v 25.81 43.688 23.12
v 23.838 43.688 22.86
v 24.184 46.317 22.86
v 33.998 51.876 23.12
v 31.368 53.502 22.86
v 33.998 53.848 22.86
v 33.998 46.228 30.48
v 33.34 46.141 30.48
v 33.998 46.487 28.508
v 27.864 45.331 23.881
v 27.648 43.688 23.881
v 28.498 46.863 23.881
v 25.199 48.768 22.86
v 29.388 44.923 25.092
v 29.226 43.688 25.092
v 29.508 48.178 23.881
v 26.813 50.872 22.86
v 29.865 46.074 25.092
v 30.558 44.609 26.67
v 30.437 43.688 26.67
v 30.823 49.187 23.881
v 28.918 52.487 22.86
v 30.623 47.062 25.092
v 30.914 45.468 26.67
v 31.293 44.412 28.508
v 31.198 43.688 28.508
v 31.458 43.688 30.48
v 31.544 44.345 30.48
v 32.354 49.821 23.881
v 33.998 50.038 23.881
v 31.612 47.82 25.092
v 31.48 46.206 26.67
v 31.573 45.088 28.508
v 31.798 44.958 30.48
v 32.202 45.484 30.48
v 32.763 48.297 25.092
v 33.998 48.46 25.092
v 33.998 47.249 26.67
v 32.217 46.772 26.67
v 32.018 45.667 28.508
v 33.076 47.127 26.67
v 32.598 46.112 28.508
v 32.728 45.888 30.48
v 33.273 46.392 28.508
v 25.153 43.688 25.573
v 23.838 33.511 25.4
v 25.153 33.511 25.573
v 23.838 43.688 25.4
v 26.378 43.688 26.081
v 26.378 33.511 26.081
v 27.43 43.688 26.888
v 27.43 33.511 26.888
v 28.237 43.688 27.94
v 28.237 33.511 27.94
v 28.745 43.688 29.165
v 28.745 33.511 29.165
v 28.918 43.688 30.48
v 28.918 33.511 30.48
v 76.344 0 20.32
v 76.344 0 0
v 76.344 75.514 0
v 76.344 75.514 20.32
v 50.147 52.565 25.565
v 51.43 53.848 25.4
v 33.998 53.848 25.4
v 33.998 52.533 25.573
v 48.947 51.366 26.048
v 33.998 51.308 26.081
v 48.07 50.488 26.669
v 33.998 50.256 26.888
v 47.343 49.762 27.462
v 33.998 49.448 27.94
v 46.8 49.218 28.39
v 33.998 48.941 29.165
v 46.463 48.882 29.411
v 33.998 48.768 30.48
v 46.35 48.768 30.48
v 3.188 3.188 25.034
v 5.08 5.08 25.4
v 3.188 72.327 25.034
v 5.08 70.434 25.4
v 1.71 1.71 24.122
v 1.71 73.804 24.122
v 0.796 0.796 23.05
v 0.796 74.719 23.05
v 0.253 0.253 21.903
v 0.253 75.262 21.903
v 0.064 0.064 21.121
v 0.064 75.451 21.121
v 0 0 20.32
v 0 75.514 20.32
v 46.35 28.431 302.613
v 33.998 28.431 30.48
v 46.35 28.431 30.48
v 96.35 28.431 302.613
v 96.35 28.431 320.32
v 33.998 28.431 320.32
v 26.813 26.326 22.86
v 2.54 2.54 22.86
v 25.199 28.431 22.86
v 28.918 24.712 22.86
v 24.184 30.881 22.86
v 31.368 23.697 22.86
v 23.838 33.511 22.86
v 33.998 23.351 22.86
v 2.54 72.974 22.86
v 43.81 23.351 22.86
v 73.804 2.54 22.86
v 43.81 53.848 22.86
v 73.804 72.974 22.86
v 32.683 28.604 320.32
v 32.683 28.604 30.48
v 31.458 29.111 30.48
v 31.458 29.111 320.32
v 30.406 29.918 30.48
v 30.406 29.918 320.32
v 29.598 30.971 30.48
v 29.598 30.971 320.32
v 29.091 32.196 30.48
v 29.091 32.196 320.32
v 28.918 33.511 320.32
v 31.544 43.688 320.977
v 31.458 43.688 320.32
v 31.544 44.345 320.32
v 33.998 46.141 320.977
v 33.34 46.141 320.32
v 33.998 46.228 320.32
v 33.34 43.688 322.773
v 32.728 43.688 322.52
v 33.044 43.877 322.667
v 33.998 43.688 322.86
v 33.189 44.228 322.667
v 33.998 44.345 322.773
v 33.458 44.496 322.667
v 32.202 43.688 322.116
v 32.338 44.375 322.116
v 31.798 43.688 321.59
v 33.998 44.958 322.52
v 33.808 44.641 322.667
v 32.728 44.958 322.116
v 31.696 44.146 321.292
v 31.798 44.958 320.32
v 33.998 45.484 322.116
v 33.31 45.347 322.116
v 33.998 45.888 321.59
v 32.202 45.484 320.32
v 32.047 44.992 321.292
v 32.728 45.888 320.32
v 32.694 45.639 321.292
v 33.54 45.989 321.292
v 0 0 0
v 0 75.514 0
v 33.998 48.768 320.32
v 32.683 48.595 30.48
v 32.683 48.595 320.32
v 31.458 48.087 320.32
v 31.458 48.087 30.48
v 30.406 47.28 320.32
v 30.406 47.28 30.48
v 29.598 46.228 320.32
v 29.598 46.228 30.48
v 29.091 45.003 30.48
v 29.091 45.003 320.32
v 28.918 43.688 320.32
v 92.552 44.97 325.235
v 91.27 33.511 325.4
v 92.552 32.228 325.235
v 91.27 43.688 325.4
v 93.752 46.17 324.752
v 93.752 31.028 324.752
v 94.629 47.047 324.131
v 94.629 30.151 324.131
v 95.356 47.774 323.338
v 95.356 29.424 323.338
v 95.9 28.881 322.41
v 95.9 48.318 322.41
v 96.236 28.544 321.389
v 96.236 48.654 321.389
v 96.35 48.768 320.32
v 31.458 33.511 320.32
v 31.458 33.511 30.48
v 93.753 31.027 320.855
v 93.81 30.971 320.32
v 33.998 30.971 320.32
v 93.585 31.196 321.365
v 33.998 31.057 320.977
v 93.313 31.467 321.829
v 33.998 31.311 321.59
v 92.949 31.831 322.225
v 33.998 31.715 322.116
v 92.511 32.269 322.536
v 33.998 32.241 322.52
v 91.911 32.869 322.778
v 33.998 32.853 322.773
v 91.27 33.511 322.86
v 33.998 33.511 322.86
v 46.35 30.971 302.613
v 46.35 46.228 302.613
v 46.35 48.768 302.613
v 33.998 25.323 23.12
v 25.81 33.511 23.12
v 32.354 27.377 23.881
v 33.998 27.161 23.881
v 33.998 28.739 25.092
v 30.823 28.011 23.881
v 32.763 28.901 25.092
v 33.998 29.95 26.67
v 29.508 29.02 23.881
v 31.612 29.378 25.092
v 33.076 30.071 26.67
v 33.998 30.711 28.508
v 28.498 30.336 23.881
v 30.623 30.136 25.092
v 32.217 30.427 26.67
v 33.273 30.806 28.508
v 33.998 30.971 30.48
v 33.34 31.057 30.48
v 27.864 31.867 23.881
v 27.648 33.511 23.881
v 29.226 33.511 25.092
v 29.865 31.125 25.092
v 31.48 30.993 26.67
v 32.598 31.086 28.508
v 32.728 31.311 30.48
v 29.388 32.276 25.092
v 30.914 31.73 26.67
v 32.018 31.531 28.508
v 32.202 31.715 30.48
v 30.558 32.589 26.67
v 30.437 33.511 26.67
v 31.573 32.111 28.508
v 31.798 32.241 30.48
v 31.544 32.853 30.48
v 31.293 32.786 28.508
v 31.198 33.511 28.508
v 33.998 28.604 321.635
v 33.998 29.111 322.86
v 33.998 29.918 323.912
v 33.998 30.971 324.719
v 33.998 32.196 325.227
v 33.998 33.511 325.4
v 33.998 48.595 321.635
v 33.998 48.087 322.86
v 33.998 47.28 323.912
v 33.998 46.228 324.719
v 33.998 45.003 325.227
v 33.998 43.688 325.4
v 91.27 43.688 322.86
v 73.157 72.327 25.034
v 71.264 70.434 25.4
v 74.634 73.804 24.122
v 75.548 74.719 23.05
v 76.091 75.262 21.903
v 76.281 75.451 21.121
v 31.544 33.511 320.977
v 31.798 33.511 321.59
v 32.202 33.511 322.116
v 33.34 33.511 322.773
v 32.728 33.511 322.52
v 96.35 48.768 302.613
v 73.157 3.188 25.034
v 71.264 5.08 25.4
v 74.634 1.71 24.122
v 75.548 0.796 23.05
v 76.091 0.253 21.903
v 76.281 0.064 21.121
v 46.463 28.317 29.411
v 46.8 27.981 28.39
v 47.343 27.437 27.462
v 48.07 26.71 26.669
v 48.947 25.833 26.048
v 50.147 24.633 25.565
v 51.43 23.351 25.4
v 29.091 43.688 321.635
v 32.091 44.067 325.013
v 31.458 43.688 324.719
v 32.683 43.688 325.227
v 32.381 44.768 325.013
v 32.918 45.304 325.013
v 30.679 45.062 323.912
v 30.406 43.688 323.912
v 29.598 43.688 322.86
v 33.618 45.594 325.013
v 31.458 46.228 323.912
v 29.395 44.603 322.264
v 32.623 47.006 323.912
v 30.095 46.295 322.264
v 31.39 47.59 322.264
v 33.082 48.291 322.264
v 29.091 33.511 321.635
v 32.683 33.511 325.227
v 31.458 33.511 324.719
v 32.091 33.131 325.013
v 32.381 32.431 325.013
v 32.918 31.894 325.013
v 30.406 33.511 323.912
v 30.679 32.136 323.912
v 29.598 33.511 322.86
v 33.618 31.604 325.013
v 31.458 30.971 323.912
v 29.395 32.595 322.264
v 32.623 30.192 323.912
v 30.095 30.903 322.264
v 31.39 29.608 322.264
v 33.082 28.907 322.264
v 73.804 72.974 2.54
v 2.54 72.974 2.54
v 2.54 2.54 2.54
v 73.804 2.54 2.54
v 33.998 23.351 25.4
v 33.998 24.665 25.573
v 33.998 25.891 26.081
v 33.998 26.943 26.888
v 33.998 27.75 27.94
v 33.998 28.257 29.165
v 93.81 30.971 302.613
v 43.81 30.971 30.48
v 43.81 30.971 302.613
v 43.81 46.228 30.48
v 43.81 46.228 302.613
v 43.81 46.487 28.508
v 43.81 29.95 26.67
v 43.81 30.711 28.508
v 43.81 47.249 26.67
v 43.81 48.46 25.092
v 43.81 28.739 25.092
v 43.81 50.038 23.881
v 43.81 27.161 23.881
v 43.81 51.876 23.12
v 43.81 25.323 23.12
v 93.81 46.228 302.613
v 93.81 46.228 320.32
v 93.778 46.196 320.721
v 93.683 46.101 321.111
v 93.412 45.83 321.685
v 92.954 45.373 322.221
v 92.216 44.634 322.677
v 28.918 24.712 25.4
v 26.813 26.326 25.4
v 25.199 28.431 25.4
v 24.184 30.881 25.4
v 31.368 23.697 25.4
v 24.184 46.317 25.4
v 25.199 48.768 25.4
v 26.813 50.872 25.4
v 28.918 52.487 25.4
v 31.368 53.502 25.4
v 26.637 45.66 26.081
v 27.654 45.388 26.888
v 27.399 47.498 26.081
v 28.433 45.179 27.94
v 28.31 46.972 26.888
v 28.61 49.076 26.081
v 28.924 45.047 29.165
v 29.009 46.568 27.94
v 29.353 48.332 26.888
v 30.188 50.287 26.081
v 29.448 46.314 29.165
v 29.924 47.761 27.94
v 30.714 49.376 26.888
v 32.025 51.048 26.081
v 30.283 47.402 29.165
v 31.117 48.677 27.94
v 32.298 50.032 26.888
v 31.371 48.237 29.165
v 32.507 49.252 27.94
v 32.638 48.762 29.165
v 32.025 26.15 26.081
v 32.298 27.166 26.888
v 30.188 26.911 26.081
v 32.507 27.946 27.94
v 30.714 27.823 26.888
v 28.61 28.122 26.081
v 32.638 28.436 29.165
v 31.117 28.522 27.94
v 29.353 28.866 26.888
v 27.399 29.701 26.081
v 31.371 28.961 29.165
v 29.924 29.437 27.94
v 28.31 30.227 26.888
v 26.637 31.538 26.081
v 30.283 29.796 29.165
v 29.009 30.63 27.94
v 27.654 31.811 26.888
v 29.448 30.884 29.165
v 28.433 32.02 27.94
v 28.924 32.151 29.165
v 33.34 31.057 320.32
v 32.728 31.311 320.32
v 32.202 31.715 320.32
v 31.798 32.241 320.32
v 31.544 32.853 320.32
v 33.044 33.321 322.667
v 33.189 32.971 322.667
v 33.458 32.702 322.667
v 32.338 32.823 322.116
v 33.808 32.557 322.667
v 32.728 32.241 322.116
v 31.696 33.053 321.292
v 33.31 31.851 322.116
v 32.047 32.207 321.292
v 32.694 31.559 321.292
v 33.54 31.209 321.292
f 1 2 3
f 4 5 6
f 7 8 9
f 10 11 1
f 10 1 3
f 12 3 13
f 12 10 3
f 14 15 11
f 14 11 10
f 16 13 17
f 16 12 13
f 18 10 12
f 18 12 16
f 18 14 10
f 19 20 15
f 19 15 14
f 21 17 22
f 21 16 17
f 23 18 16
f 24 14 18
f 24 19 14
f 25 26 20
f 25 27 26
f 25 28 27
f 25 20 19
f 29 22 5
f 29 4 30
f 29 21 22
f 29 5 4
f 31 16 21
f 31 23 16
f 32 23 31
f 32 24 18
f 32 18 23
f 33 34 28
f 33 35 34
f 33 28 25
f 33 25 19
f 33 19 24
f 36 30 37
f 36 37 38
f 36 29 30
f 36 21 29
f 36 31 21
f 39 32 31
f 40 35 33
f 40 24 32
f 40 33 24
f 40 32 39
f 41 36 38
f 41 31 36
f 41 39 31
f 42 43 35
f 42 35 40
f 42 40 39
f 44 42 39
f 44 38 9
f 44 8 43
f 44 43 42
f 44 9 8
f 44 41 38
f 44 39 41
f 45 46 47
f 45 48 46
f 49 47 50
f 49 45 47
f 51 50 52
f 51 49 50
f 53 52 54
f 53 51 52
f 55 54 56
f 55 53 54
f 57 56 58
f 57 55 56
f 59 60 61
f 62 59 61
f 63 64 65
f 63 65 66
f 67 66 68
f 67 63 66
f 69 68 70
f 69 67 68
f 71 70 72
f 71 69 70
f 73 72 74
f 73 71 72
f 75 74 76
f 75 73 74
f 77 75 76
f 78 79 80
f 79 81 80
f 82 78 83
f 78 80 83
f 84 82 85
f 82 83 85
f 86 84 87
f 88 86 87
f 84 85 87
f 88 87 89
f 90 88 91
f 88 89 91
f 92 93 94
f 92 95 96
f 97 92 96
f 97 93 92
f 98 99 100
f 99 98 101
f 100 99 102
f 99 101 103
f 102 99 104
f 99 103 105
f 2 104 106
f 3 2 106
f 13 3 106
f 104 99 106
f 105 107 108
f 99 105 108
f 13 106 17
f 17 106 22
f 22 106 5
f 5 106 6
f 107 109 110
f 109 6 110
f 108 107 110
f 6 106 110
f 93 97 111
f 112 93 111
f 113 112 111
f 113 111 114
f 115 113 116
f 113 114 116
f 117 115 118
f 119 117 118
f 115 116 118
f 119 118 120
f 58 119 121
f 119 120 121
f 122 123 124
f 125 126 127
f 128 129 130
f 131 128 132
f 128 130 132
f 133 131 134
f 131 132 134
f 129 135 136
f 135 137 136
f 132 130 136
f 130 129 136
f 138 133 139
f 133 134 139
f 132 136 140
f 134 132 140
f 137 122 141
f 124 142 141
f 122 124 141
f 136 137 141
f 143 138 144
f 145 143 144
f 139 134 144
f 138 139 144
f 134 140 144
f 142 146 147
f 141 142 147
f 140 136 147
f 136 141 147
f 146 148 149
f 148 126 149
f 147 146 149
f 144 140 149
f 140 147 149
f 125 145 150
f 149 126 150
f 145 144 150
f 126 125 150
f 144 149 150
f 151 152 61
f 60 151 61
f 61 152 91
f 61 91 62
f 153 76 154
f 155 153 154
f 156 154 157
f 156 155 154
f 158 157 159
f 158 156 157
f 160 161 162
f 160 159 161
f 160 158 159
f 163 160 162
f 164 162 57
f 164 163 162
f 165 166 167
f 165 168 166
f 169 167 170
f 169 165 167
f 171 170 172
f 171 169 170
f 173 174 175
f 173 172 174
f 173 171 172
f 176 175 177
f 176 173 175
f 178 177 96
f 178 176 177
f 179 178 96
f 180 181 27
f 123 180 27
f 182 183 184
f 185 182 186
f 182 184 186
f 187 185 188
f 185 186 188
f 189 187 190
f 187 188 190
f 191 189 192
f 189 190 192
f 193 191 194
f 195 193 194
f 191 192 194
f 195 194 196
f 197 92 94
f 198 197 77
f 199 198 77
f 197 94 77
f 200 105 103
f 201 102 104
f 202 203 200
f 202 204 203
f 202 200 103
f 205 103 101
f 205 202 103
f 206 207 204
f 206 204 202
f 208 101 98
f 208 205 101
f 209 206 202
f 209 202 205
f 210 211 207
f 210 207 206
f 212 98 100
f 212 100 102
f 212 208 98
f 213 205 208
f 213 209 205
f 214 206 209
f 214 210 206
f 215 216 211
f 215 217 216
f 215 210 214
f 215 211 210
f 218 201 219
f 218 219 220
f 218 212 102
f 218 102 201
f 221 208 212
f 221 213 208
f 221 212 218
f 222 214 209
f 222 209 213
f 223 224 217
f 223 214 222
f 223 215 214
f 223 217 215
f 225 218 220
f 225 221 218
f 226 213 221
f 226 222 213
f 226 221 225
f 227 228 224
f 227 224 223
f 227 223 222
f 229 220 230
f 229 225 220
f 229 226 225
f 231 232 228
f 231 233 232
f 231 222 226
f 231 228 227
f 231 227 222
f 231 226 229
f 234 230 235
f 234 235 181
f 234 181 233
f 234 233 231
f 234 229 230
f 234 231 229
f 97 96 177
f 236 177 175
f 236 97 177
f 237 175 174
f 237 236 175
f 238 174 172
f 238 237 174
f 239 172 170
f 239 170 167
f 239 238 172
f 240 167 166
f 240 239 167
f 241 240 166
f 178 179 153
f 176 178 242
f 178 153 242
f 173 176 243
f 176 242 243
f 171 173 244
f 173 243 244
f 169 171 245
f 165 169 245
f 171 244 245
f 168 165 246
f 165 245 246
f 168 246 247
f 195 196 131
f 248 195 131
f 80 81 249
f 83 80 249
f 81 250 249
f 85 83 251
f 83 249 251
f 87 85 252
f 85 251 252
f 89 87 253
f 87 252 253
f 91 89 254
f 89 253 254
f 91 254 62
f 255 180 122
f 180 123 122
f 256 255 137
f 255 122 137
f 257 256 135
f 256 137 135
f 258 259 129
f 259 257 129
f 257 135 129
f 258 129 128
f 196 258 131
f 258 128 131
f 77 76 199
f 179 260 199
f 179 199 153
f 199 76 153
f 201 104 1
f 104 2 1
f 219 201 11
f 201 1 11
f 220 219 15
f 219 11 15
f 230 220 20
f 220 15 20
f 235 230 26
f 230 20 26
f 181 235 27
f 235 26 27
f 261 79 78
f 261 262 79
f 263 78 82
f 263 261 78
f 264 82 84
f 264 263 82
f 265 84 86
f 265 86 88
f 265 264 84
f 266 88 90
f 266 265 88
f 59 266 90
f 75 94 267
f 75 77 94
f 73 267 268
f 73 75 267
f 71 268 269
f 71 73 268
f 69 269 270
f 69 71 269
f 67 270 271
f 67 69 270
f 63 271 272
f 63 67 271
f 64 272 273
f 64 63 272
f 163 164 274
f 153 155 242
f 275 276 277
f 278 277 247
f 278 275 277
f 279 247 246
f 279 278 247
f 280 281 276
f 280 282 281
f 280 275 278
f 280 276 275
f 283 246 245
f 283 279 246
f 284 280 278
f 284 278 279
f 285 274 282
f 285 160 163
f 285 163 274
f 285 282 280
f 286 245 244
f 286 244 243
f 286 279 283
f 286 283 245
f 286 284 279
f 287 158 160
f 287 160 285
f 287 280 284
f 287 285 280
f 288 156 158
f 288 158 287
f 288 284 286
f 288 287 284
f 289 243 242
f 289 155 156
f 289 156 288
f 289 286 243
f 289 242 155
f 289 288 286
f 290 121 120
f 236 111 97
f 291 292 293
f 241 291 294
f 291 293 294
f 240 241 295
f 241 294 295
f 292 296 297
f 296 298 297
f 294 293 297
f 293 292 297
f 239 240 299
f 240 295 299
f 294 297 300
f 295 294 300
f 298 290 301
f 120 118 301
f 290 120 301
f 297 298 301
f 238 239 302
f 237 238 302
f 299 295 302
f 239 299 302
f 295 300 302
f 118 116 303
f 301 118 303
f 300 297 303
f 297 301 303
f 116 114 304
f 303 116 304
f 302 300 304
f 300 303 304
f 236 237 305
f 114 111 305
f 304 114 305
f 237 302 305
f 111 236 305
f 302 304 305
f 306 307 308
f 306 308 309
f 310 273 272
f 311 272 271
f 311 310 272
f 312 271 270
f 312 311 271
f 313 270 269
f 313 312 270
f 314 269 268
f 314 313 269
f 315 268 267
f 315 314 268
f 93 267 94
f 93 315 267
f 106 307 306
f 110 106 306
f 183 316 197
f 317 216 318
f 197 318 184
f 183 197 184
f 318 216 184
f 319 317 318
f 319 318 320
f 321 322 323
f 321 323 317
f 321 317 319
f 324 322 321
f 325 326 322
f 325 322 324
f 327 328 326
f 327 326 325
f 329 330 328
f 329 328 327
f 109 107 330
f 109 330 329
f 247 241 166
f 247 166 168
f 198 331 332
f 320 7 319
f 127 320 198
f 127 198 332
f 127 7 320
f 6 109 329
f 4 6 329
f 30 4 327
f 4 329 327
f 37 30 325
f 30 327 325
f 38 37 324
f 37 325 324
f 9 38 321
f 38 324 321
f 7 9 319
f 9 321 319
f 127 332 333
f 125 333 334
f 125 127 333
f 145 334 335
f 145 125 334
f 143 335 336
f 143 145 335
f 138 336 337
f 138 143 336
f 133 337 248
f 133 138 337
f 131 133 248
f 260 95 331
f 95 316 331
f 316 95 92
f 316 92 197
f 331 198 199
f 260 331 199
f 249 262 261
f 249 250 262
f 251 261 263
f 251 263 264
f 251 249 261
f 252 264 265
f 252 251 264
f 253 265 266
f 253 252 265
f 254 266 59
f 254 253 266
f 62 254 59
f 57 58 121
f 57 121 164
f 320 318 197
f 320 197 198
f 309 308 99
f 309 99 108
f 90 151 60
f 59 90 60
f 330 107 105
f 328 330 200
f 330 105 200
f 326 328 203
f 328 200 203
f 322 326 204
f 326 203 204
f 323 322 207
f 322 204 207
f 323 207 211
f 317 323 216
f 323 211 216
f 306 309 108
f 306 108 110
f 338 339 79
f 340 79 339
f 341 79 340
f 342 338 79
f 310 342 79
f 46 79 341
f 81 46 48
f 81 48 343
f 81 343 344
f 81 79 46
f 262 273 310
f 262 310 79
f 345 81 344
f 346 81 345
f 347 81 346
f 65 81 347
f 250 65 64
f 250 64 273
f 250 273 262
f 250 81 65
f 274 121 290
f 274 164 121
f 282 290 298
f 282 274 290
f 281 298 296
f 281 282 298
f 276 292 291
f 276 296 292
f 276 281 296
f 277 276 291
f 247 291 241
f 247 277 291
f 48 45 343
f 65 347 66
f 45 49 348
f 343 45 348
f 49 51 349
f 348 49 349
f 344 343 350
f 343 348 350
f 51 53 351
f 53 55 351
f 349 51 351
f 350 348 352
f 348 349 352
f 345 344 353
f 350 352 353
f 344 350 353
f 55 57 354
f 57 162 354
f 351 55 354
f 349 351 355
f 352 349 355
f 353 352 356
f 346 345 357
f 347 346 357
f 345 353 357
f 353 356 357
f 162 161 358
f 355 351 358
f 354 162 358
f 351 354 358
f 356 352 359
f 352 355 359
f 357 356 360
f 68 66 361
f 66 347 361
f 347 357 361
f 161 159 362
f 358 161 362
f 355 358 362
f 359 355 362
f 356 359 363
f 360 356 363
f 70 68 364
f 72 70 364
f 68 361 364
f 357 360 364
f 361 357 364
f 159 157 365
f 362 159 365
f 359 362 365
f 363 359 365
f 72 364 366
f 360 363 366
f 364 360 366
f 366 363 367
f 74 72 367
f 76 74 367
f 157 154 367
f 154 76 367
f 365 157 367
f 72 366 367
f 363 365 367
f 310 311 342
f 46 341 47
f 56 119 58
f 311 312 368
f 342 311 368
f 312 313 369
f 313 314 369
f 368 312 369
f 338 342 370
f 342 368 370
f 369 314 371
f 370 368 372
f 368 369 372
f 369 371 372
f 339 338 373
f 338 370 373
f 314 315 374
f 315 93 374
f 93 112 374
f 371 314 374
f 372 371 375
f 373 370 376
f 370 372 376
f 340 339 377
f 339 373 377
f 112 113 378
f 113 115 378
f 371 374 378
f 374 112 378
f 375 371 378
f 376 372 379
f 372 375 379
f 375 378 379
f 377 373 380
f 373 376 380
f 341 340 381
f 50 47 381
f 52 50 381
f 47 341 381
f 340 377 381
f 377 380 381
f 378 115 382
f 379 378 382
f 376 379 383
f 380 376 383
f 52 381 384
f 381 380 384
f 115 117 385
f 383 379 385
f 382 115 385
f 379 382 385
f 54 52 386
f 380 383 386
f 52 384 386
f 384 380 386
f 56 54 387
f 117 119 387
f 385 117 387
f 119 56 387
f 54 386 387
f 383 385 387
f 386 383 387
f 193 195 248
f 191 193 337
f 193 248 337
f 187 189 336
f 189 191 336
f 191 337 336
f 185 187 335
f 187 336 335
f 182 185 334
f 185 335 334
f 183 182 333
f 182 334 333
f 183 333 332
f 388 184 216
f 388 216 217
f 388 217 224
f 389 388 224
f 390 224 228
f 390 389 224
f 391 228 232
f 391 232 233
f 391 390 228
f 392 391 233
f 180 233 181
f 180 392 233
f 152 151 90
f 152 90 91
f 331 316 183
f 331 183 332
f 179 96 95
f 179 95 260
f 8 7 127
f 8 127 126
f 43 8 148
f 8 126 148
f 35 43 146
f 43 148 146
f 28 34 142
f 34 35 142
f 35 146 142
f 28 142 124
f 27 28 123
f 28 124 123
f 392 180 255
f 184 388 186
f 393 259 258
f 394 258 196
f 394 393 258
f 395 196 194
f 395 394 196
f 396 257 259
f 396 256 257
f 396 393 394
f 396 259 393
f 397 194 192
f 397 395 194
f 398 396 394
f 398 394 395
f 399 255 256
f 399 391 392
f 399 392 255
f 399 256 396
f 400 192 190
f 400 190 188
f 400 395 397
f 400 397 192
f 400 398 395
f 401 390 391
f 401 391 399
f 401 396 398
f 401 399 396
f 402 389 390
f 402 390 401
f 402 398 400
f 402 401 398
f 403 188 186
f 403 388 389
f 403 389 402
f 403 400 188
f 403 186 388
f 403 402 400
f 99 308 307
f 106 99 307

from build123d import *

# Parameters (mm, degrees)
F0_W        = 76.344192028
F0_H        = 75.5144134164
F1_DEPTH    = 25.4
F2_W        = 17.4319148064
F2_H        = 20.3372240067
F3_DEPTH    = 300
F4_W        = 20.3372240067
F4_H        = 22.7871290684
F5_DEPTH    = 50
F6_F1_R     = 5.08
F6_F2_R     = 5.08
F7_T        = 2.54
F7_T3_DEPTH = 10.16
F7_T5_DEPTH = 25.4172240067
F7_T7_DEPTH = 10.16
F8_R        = 5.08


# Not quite as in the source:
# - a shell that OpenCascade refuses in one call is made with other operations: the cavity is built on its own and cut out


with BuildPart() as f1:
    # F0 (on Top) → F1 (new body)
    with BuildSketch(Plane.XY):
        with Locations((38.172096014, 37.7572067082)):
            Rectangle(F0_W, F0_H)
    extrude(amount=F1_DEPTH)

    # F2 (on face) → F3 (join)
    with BuildSketch(Plane.XY.offset(25.4)):
        with Locations((37.6336574554, 38.5992005467)):
            Rectangle(F2_W, F2_H)
    extrude(amount=F3_DEPTH)

    # F4 (on face) → F5 (join)
    with BuildSketch(Plane.YZ.offset(46.3496148586)):
        with Locations((38.5992005467, 314.0064354658)):
            Rectangle(F4_W, F4_H)
    extrude(amount=F5_DEPTH)

    # F6: fillet of radius 5.08 on 7 edges, made by hand

    # F6_f1
    f6_f1_edges = [f1.edges().sort_by_distance(p)[0] for p in [
        (28.9177000523, 48.7678125501, 175.4),
        (28.9177000523, 28.4305885434, 175.4),
        (28.9177000523, 38.5992005467, 325.4),
        (62.6336574554, 48.7678125501, 325.4),
        (62.6336574554, 28.4305885434, 325.4),
        (96.3496148586, 38.5992005467, 325.4),
    ]]
    fillet(f6_f1_edges, radius=F6_F1_R)

    # F6_f2
    f6_f2_edges = [f1.edges().sort_by_distance(p)[0] for p in [
        (28.9177000523, 38.5992005467, 25.4),
        (30.4055976038, 47.2799149985, 25.4),
        (30.4055976038, 29.918486095, 25.4),
    ]]
    fillet(f6_f2_edges, radius=F6_F2_R)

    # F7: shell of thickness 2.54, made by hand


with BuildPart() as f7_core1:
    # F7_t2: copy of F1
    add(f1.part)

    # the walls: a layer under each face that stays
    f7_faces = [f7_core1.faces().sort_by_distance(p)[0] for p in [
        (12.7240320047, 12.5857355694, 25.4),
        (46.3496148586, 38.5992005467, 164.0064354658),
        (40.1736574554, 50.2557101016, 26.8878975516),
        (29.3534951554, 48.3320174469, 26.8878975516),
        (40.1736574554, 26.9426909918, 26.8878975516),
        (27.4298025007, 38.5992005467, 26.8878975516),
        (29.3534951554, 28.8663836466, 26.8878975516),
        (0, 37.7572067082, 12.7),
        (38.172096014, 75.5144134164, 12.7),
        (38.172096014, 0, 12.7),
        (76.344192028, 37.7572067082, 12.7),
        (44.3896858533, 48.7678125501, 272.0133333333),
        (44.3896858533, 28.4305885434, 272.0133333333),
        (30.4055976038, 47.2799149985, 175.4),
        (28.9177000523, 38.5992005467, 175.4),
        (30.4055976038, 29.918486095, 175.4),
        (38.172096014, 37.7572067082, 0),
        (65.1736574554, 47.2799149985, 323.9121024484),
        (96.3496148586, 38.5992005467, 311.4664354658),
        (65.1736574554, 29.918486095, 323.9121024484),
        (31.4577000523, 46.2278125501, 323.9121024484),
        (30.4055976038, 38.5992005467, 323.9121024484),
        (31.4577000523, 30.9705885434, 323.9121024484),
        (62.6336574554, 38.5992005467, 325.4),
        (94.8617173071, 38.5992005467, 323.9121024484),
    ]]
    thicken(f7_faces, amount=-F7_T, mode=Mode.SUBTRACT)

    # F7_s4 → F7_t3 (cut)
    with BuildSketch(Plane.XZ.offset(-56.3878125501)):
        Polygon((46.3750148586, 25.4254), (46.3496148586, 22.86), (43.8096148586, 22.86), (43.8096148586, 25.4), align=None)
    extrude(amount=F7_T3_DEPTH, mode=Mode.SUBTRACT)

    # F7_s6 → F7_t5 (cut)
    with BuildSketch(Plane.XZ.offset(-51.3078125501)):
        Polygon((46.3750148586, 25.4254), (46.3496148586, 22.86), (43.8096148586, 22.86), (43.8096148586, 25.4), align=None)
    extrude(amount=F7_T5_DEPTH, mode=Mode.SUBTRACT)

    # F7_s8 → F7_t7 (cut)
    with BuildSketch(Plane.XZ.offset(-30.9705885434)):
        Polygon((46.3750148586, 25.4254), (46.3496148586, 22.86), (43.8096148586, 22.86), (43.8096148586, 25.4), align=None)
    extrude(amount=F7_T7_DEPTH, mode=Mode.SUBTRACT)


with BuildPart() as f1_1:
    add(f1.part)

    # what is left inside the walls is the cavity
    f7_cavity = [f7_core1.part.solids().sort_by_distance(p)[0] for p in [
        (38.172096, 26.018138, 2.5654),
    ]]
    add(f7_cavity, mode=Mode.SUBTRACT)

    # F8
    f8_edges = [f1_1.edges().sort_by_distance(p)[0] for p in [
        (46.349615, 38.599201, 25.4),
        (40.173657, 23.350589, 25.4),
        (26.813495, 26.326384, 25.4),
        (23.8377, 38.599201, 25.4),
        (26.813495, 50.872017, 25.4),
        (40.173657, 53.847813, 25.4),
        (0, 37.757207, 25.4),
        (38.172096, 0, 25.4),
        (76.344192, 37.757207, 25.4),
        (38.172096, 75.514413, 25.4),
    ]]
    fillet(f8_edges, radius=F8_R)


solid = f1_1.part
